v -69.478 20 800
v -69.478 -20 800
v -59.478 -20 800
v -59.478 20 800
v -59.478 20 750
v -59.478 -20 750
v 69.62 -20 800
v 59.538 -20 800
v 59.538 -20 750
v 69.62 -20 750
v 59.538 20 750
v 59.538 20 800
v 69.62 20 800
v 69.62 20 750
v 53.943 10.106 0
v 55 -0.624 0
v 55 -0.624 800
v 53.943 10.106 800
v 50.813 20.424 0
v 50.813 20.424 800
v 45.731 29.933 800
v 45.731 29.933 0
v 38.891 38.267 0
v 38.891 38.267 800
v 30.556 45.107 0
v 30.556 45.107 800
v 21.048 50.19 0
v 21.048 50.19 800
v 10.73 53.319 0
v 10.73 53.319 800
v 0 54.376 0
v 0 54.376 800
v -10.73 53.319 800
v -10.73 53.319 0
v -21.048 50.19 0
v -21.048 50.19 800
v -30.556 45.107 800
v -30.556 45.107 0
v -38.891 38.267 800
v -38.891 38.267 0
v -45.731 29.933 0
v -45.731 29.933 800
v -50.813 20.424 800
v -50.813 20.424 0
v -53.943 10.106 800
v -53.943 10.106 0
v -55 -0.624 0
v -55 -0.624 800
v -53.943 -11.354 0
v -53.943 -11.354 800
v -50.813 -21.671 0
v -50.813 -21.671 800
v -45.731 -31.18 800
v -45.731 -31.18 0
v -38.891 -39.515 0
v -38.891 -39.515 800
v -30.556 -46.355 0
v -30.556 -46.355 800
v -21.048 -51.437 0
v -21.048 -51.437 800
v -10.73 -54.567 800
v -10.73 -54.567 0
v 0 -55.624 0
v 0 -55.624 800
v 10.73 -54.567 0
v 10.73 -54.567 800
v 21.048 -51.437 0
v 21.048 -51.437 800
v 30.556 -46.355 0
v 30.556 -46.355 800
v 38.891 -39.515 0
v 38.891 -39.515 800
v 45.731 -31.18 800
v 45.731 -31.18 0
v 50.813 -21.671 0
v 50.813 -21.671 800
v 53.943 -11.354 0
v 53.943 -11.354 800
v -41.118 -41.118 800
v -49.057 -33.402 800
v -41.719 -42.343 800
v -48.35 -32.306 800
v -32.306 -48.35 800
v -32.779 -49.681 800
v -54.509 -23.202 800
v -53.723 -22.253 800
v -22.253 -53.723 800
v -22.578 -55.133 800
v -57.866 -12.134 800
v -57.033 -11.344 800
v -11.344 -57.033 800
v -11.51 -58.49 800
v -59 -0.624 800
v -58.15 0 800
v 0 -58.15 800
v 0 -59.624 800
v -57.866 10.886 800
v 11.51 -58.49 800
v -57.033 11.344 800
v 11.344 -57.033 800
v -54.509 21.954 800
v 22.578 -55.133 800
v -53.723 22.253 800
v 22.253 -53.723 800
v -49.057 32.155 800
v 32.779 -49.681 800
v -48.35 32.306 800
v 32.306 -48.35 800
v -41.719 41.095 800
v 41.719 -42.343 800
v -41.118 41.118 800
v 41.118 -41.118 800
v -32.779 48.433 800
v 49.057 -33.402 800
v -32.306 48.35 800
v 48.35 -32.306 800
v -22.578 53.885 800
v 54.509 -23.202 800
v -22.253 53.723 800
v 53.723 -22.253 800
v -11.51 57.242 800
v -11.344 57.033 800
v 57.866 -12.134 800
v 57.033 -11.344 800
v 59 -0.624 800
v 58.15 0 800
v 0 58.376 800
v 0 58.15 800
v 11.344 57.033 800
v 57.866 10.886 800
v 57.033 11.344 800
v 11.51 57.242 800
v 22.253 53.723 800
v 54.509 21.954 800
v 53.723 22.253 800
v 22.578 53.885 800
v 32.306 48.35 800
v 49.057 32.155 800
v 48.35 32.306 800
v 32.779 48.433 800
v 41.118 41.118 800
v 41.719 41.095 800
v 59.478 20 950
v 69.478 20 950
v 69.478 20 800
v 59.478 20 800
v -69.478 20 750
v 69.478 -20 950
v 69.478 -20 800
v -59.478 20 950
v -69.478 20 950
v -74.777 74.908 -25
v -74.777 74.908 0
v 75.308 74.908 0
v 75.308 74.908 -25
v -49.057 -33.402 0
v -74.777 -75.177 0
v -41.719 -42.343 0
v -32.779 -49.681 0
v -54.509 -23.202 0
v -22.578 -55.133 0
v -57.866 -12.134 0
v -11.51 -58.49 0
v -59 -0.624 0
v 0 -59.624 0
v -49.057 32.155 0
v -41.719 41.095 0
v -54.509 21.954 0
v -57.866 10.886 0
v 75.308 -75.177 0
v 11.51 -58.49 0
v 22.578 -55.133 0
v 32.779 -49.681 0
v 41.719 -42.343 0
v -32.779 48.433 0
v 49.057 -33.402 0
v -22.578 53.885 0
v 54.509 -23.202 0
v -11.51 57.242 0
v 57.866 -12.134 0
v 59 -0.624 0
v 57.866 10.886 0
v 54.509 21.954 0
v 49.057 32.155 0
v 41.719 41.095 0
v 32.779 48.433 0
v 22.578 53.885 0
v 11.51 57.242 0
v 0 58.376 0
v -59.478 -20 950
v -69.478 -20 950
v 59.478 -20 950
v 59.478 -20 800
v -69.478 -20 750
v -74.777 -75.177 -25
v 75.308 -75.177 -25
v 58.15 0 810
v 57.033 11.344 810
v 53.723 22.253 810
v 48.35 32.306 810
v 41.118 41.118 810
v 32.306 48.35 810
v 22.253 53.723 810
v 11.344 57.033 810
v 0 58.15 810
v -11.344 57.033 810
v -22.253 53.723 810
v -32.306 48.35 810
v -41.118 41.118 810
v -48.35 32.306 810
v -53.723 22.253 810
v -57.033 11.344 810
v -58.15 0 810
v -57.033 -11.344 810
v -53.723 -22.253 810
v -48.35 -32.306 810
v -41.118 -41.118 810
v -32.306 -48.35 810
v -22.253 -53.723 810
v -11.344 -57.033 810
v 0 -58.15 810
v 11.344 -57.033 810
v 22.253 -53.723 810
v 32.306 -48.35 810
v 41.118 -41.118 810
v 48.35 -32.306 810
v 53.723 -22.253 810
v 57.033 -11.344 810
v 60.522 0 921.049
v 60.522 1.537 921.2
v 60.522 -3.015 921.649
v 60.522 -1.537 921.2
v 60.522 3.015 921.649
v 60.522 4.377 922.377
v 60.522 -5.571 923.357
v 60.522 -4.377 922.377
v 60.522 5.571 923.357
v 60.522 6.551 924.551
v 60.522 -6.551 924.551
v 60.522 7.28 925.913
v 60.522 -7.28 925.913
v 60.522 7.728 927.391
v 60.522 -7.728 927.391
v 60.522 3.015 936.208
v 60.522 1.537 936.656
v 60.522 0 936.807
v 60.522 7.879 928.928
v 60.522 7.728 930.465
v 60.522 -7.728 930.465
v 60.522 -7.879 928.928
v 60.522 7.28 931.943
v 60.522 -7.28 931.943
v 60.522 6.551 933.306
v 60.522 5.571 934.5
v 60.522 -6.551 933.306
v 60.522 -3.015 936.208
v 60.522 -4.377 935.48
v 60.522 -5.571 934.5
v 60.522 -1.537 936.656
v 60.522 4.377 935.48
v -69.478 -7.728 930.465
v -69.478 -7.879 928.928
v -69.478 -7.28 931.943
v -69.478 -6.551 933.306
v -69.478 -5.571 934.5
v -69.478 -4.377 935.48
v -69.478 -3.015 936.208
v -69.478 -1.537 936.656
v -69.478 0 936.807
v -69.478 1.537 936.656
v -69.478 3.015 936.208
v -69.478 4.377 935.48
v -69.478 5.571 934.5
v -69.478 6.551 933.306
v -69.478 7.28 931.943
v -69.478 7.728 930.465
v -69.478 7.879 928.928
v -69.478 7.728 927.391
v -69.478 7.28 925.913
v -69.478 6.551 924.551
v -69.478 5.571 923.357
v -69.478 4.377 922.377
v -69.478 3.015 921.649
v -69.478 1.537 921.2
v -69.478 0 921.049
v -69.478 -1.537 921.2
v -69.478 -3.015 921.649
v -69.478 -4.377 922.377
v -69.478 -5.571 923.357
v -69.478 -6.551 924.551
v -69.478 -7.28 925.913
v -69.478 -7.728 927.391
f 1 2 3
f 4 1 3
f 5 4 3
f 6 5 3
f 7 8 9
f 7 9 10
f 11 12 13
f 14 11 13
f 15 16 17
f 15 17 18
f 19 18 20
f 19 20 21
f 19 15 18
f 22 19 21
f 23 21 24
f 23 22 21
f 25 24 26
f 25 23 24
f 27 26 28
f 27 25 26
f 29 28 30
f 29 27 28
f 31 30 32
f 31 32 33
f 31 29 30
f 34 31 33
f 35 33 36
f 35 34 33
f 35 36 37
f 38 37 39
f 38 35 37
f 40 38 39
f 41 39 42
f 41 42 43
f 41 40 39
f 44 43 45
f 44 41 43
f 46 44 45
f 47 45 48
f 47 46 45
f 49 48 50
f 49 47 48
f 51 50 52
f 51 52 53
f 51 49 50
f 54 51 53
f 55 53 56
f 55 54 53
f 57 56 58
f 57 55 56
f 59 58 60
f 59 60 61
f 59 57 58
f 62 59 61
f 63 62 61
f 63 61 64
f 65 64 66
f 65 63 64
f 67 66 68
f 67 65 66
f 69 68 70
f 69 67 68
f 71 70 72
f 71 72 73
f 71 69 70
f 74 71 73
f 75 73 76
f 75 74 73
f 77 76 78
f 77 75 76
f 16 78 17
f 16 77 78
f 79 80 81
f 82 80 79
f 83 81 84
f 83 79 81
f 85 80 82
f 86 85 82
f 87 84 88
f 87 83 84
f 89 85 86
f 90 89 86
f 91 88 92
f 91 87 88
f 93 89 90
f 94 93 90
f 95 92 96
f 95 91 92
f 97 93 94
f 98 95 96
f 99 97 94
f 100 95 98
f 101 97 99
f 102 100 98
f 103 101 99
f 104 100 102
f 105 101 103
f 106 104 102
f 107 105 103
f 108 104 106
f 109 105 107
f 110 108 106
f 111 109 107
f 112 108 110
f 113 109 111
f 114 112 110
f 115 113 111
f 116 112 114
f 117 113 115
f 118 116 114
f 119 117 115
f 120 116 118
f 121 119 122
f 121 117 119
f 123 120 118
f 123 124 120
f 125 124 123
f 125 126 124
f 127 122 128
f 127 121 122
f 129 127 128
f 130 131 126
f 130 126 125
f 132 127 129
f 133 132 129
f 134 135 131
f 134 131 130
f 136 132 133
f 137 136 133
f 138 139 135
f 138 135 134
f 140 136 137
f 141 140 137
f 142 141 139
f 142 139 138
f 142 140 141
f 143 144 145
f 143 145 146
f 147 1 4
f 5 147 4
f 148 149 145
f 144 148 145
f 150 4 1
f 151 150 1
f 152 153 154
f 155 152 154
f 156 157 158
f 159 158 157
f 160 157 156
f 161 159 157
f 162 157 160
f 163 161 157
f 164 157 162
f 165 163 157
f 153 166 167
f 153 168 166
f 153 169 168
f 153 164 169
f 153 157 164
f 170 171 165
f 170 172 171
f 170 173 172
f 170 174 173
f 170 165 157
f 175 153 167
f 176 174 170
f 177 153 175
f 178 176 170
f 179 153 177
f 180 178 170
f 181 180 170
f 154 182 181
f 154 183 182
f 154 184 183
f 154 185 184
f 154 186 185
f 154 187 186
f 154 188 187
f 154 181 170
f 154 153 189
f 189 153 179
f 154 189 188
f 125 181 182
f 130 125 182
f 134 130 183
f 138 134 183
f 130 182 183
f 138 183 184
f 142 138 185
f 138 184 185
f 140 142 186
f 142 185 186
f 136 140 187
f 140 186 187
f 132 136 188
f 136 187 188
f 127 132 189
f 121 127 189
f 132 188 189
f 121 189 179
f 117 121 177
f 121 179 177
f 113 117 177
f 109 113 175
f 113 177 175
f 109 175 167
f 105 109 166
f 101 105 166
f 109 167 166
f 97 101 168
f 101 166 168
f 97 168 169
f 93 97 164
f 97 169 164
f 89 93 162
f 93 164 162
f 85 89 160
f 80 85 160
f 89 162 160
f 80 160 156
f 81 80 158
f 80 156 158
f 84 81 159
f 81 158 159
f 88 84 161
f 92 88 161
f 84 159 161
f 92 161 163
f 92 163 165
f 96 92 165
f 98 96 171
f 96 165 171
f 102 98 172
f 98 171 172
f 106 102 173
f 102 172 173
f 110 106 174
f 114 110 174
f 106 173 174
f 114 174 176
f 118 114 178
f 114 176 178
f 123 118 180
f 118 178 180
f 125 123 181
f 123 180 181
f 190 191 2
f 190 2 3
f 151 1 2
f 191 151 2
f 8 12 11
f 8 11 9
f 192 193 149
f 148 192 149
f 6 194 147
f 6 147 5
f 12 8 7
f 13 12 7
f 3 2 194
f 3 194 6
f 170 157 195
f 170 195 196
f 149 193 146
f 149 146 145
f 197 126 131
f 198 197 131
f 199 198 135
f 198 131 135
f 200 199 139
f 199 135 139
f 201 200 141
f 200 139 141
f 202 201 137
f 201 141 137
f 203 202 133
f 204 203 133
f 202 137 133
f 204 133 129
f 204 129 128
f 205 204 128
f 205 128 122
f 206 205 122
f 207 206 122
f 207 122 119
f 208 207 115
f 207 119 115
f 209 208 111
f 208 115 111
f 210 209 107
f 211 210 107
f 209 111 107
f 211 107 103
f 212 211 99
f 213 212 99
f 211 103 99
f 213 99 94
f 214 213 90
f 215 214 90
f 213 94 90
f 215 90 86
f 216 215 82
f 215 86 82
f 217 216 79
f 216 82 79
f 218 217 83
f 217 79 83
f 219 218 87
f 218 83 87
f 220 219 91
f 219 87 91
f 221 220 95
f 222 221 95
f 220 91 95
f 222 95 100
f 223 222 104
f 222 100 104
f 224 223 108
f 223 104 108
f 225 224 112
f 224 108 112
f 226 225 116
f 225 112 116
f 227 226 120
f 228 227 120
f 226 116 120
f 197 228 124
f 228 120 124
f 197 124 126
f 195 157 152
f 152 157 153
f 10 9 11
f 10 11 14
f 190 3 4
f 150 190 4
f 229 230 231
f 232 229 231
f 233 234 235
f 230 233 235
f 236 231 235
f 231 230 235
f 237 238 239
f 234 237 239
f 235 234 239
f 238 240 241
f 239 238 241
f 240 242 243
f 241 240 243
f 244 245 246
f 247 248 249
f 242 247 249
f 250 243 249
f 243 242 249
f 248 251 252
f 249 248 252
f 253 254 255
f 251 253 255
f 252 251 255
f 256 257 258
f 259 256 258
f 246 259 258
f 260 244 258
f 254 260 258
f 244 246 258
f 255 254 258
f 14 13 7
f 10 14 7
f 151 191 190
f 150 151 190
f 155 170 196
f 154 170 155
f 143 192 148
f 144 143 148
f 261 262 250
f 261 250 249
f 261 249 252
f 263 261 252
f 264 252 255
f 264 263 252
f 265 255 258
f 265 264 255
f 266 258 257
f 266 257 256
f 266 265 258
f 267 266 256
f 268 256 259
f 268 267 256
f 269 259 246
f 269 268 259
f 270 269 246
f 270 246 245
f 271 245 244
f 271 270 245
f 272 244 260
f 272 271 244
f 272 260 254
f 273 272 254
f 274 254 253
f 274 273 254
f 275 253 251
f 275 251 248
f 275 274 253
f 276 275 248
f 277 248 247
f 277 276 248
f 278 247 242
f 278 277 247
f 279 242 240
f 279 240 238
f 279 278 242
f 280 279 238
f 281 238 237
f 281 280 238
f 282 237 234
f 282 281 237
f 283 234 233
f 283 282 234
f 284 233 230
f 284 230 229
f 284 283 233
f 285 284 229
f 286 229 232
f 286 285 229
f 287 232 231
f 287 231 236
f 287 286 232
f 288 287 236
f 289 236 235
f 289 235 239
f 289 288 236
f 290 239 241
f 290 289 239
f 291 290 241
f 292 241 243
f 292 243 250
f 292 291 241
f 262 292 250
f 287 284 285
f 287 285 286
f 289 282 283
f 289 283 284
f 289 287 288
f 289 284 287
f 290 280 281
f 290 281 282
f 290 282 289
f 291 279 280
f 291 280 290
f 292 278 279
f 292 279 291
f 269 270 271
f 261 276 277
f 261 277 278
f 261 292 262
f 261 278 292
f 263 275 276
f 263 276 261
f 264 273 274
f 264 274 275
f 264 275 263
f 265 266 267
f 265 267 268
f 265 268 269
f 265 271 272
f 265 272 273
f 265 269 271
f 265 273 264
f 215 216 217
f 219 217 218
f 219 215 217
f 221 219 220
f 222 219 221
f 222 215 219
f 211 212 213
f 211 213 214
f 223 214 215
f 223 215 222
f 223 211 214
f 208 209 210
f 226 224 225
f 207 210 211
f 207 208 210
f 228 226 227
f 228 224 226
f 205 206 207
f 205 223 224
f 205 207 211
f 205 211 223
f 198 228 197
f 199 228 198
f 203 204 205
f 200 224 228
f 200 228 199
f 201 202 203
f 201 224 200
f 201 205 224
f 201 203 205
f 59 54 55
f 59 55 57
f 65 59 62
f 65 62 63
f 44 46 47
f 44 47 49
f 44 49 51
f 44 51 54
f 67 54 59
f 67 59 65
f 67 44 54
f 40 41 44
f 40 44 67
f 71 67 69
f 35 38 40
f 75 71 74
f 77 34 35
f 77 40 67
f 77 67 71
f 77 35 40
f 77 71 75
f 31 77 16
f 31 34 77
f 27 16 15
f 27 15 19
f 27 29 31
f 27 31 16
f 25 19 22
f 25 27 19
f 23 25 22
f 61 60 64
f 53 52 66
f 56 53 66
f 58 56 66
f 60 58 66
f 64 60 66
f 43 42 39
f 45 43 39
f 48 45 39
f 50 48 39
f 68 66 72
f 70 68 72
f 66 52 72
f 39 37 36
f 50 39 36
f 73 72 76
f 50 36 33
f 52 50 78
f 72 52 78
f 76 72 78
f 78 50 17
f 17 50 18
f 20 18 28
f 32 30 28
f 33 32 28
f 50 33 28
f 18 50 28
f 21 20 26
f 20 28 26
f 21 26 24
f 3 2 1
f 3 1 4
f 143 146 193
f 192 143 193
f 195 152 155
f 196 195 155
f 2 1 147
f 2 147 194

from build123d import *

# Parameters (mm, degrees)
F1_R      = 59
F1_R_2    = 55
F2_DEPTH  = 800
F5_DEPTH  = 150
F6_R      = 7.8792773039
F7_DEPTH  = 130
F8_W      = 150.0847637653
F8_H      = 150.0847563148
F9_DEPTH  = 25
F10_R     = 58.1498835162
F11_DEPTH = 10
F12_W     = 10
F12_H     = 40
F13_DEPTH = 50
F12_W_2   = 10.0821182132


with BuildPart() as f2:
    # F1 (on face) → F2 (new body)
    with BuildSketch(Plane.XY):
        with Locations((0, -0.623856195)):
            Circle(F1_R)
        with Locations((0, -0.623856195)):
            Circle(F1_R_2, mode=Mode.SUBTRACT)
    extrude(amount=F2_DEPTH)

    # F8 (on Top) → F9 (join)
    with BuildSketch(Plane.XY):
        with Locations((0.2654120326, -0.1345165074)):
            Rectangle(F8_W, F8_H)
    extrude(amount=-F9_DEPTH)

    # F10 (on face) → F11 (join)
    with BuildSketch(Plane.XY.offset(800)):
        Circle(F10_R)
    extrude(amount=F11_DEPTH)


with BuildPart() as f5:
    # F4 (on face) → F5 (new body)
    with BuildSketch(Plane.XY.offset(800)):
        Polygon((59.4776570797, 20), (59.4776570797, 0), (59.4776570797, -20), (69.4776570797, -20), (69.4776570797, 20), align=None)
    extrude(amount=F5_DEPTH)


with BuildPart() as f5b:
    # F4 (on face) → F5, piece 2 (new body)
    with BuildSketch(Plane.XY.offset(800)):
        Polygon((-59.4776570797, -20), (-59.4776570797, 0), (-59.4776570797, 20), (-69.4776570797, 20), (-69.4776570797, -20), align=None)
    extrude(amount=F5_DEPTH)


with BuildPart() as f7:
    # F6 (on face) → F7 (new body)
    with BuildSketch(Plane(origin=(-69.4776570797, 0, 0), x_dir=(0, -1, 0), z_dir=(-1, 0, 0))):
        with Locations((0, 928.9281964302)):
            Circle(F6_R)
    extrude(amount=-F7_DEPTH)


with BuildPart() as f13:
    # F12 (on face) → F13 (new body)
    with BuildSketch(Plane(origin=(0, 0, 800), x_dir=(1, 0, 0), z_dir=(0, 0, -1))):
        with Locations((-64.4776570797, 0)):
            Rectangle(F12_W, F12_H)
    extrude(amount=F13_DEPTH)


with BuildPart() as f13b:
    # F12 (on face) → F13, piece 2 (new body)
    with BuildSketch(Plane(origin=(0, 0, 800), x_dir=(1, 0, 0), z_dir=(0, 0, -1))):
        with Locations((64.5794086158, 0)):
            Rectangle(F12_W_2, F12_H)
    extrude(amount=F13_DEPTH)


solid = Compound([f2.part, f5.part, f5b.part, f7.part, f13.part, f13b.part])
